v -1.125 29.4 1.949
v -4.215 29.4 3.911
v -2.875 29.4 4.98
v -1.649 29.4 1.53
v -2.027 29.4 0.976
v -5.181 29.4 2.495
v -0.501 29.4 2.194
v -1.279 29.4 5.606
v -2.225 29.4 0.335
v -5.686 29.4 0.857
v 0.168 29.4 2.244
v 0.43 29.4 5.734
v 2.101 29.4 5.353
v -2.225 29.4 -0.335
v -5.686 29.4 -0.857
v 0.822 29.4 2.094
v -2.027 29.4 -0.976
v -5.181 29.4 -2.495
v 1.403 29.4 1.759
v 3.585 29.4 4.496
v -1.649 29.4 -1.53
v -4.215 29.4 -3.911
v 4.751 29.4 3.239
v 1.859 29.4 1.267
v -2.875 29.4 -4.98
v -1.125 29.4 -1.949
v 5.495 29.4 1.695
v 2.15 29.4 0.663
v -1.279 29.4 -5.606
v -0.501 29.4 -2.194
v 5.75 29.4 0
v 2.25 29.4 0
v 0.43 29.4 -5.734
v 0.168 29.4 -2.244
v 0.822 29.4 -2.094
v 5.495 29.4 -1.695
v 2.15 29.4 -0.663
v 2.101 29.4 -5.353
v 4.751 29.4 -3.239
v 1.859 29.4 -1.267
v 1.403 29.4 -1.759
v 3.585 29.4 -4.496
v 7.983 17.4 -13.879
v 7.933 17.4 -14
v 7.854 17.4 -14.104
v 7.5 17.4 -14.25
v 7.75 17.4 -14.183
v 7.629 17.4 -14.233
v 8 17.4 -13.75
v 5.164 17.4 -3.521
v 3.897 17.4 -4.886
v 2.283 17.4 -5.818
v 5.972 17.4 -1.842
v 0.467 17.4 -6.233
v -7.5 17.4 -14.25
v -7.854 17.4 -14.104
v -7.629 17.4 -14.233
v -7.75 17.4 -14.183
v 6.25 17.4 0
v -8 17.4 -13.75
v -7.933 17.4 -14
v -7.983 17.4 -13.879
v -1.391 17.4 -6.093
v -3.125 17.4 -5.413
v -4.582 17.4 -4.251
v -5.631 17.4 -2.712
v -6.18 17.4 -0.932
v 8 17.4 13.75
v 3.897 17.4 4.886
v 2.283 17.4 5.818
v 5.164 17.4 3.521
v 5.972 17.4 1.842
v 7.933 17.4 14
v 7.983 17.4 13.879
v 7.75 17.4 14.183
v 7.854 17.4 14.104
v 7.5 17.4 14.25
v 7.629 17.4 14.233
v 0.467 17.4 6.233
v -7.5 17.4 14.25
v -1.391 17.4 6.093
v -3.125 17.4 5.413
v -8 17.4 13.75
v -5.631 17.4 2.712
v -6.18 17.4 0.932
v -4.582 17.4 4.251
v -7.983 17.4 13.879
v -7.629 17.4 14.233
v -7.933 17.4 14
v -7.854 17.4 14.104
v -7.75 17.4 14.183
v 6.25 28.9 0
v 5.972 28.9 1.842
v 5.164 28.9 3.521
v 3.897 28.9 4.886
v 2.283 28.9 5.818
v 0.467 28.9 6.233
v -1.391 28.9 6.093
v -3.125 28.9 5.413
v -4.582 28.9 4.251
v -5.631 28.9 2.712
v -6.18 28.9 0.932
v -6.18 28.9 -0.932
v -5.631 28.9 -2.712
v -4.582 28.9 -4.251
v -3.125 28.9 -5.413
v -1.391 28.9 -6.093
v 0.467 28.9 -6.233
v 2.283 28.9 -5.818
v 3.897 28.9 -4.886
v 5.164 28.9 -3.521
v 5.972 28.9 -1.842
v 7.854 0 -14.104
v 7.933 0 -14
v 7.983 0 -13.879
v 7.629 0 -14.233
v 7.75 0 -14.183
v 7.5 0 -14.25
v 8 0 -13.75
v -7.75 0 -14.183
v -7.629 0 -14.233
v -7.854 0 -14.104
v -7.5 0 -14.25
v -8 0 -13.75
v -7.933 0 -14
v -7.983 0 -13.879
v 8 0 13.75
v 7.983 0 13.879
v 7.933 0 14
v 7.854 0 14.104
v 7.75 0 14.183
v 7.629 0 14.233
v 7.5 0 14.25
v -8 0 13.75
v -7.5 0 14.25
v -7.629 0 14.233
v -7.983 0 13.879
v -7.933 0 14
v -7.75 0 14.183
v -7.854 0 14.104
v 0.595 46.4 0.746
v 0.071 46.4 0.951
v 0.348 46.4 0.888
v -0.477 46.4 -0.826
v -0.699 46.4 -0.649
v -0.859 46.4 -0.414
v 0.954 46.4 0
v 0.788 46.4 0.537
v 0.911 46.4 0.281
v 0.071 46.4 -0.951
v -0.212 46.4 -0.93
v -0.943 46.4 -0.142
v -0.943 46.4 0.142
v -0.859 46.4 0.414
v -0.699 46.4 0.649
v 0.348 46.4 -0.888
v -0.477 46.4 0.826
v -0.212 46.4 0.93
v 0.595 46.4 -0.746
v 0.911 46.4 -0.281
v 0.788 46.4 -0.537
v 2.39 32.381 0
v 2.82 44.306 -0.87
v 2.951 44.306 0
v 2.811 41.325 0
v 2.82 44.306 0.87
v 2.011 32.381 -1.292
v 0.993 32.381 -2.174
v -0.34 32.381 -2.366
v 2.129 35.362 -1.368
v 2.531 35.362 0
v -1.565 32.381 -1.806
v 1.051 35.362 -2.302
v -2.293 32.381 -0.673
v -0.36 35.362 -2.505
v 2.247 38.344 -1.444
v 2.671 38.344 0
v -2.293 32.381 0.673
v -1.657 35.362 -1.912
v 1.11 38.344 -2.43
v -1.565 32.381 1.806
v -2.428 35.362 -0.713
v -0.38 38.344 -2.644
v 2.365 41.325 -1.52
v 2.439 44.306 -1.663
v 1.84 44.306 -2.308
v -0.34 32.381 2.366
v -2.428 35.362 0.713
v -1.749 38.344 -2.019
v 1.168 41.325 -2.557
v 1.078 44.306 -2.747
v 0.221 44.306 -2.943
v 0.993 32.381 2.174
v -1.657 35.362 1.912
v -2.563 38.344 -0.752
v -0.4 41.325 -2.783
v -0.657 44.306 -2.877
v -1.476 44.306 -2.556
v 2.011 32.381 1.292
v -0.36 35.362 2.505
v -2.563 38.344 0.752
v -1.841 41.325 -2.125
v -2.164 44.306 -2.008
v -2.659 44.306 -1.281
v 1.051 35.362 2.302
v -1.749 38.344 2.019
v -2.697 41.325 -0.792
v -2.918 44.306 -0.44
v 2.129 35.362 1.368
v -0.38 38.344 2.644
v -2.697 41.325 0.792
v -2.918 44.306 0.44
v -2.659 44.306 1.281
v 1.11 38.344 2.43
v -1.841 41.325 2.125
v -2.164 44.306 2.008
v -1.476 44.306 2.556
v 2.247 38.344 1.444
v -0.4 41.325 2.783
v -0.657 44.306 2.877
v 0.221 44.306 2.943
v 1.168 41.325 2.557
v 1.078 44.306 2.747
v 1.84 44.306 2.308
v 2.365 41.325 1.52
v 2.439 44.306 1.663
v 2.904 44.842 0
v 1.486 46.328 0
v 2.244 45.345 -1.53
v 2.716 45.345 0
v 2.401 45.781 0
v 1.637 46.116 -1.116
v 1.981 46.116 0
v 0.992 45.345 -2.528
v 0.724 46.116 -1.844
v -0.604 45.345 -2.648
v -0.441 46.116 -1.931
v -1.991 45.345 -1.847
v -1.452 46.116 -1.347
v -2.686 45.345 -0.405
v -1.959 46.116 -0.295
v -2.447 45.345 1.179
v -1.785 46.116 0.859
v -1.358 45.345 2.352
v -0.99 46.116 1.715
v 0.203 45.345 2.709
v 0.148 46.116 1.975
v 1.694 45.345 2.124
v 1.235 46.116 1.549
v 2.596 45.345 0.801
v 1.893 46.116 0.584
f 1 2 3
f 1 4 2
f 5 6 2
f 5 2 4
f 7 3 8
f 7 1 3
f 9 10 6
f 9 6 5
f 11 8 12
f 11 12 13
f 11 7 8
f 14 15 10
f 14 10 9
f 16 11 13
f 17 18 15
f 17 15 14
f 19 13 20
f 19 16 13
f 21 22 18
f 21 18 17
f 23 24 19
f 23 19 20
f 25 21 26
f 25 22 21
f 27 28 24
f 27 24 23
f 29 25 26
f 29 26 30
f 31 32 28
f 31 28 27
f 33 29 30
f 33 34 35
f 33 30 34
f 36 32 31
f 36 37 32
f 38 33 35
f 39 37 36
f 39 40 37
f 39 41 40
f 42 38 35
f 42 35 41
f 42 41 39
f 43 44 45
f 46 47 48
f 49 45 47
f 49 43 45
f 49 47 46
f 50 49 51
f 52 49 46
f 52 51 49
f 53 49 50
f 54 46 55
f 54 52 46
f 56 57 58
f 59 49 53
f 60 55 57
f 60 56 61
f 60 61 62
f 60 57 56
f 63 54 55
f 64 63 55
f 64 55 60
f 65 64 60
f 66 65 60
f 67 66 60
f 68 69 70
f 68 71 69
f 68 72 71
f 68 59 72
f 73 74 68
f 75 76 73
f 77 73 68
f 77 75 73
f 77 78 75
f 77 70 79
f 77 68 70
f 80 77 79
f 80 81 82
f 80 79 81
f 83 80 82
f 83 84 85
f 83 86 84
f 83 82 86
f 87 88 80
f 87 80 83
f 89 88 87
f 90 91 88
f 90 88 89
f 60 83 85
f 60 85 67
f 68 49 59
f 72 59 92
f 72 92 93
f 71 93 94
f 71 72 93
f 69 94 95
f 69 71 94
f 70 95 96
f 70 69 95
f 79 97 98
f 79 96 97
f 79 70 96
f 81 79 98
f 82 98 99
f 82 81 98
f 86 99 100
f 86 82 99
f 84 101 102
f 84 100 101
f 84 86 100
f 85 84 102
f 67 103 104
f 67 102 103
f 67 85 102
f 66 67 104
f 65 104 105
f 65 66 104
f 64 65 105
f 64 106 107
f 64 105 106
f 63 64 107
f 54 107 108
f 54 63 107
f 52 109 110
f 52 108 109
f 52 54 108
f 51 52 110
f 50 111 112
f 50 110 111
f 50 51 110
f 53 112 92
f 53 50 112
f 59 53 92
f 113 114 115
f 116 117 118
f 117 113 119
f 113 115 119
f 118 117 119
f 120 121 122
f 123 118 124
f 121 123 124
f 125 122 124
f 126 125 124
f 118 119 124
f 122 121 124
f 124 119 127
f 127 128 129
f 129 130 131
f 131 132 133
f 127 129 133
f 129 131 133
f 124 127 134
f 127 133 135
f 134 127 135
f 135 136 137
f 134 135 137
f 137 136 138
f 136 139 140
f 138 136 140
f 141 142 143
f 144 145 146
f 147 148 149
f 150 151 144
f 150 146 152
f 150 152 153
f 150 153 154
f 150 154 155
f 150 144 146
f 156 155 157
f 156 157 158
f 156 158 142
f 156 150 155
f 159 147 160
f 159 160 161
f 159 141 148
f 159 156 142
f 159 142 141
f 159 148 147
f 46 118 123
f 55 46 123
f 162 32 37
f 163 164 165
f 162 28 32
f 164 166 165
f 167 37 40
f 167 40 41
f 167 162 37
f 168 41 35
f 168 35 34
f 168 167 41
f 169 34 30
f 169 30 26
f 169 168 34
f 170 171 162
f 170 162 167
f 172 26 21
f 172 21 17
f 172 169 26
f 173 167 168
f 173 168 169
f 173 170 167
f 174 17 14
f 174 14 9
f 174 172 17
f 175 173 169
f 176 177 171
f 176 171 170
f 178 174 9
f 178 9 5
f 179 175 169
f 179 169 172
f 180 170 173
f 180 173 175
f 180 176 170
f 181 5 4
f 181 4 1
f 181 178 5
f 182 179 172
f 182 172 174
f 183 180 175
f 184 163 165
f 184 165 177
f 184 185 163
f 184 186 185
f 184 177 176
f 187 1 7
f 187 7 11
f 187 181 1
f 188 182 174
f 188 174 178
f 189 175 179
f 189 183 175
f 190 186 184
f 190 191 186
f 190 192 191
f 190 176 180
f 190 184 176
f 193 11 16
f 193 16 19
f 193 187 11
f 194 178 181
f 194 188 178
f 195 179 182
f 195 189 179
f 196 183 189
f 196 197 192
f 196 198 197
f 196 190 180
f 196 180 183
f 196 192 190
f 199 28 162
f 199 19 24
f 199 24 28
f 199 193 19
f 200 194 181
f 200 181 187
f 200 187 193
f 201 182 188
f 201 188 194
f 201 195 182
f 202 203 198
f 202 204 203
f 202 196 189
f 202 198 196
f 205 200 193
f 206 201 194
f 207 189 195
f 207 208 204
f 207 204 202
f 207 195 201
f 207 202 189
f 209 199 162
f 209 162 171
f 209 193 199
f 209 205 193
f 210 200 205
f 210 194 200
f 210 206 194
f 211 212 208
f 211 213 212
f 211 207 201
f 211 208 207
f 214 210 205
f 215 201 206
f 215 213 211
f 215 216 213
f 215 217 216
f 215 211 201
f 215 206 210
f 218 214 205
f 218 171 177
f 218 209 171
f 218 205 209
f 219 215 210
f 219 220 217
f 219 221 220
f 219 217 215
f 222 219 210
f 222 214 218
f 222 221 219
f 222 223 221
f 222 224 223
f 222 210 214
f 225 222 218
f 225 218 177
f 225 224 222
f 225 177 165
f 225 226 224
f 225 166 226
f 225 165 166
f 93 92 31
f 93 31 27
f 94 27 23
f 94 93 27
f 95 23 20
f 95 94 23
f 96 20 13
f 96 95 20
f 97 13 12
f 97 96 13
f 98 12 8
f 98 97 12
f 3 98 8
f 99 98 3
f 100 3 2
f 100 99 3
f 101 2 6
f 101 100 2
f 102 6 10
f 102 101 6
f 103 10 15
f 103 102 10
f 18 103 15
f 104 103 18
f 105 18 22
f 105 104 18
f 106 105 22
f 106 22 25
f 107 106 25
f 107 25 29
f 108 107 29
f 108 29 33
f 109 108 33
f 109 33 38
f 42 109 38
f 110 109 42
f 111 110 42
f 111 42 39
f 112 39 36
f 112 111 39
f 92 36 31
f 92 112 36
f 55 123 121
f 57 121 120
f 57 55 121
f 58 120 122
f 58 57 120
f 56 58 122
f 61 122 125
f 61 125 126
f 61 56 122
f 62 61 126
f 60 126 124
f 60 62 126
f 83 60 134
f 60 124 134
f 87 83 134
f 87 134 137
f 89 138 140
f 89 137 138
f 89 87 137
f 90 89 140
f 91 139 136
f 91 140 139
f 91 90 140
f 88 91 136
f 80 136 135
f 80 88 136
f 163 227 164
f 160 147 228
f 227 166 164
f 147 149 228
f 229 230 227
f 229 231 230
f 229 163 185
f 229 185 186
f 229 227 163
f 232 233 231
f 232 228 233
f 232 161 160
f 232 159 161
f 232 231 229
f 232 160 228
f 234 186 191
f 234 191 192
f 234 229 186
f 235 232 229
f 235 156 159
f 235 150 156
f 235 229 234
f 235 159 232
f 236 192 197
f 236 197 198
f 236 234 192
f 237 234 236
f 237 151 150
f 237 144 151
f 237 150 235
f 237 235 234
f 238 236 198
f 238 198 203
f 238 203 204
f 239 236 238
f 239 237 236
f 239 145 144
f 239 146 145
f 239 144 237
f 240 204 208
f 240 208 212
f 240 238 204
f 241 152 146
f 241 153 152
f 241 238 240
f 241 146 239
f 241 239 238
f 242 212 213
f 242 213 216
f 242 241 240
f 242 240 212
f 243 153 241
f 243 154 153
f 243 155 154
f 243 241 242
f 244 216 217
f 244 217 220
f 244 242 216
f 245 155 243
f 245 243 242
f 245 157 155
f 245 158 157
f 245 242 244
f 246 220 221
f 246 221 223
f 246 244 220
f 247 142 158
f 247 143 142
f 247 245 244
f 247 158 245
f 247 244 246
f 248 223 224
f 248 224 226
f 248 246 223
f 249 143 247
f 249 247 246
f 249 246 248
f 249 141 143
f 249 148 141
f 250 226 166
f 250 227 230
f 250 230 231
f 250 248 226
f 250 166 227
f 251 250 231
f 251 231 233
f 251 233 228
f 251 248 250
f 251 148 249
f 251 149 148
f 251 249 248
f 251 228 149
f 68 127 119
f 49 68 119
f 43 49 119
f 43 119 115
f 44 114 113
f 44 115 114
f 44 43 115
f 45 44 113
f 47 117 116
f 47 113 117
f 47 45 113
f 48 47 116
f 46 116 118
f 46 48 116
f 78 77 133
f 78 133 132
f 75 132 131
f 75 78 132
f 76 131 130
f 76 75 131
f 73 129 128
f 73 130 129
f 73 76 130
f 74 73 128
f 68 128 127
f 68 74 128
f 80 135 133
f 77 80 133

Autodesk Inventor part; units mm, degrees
ref_plane "YZ Plane" through (0, 0, 0) normal (1, 0, 0) x (0, 1, 0)
ref_plane "XZ Plane" through (0, 0, 0) normal (0, 1, 0) x (-1, 0, 0)
sketch "Sketch1" plane through (0, 0, 0) normal (0, 1, 0) x (-1, 0, 0)
  line L0 (8, -14.25) -> (8, 14.25)
  line L1 (8, 14.25) -> (-8, 14.25)
  line L2 (-8, 14.25) -> (-8, -14.25)
  line L3 (-8, -14.25) -> (8, -14.25)
  line L4 (8, -14.25) -> (-8, 14.25) construction
  line L5 (8, 14.25) -> (-8, -14.25) construction
  point P0 (0, 0)
  dimension "d0" = 28.5
  dimension "d1" = 16
extrude "Extrusion1" add sketch "Sketch1" along normal blind 17.4
fillet "Fillet1" radius 0.5 4 edges at (-8, 8.7, 14.25) (8, 8.7, 14.25) (8, 8.7, -14.25) (-8, 8.7, -14.25)
sketch "Sketch2" plane through (0, 17.4, 0) normal (0, 1, 0) x (1, 0, 0)
  circle A0 centre (0, 0) radius 6.25
  dimension "d5" = 12.5
extrude "Extrusion2" add sketch "Sketch2" along normal blind 12
sketch "Sketch3" plane through (0, 29.4, 0) normal (0, 1, 0) x (1, 0, 0)
  circle A0 centre (0, 0) radius 2.25
  dimension "d8" = 4.5
ref_plane "Work Plane1" through (0, 46.4, 0) normal (0, 1, 0) x (1, 0, 0)
sketch "Sketch4" plane through (0, 46.4, 0) normal (0, 1, 0) x (1, 0, 0)
  circle A0 centre (0, 0) radius 3.05
  dimension "d10" = 6.1
loft "Loft1" add profiles "Sketch3", "Sketch4"
fillet "Fillet2" radius 2 1 edges at (-3.05, 46.4, 0)
chamfer "Chamfer1" distance 0.5 angle 45 1 edges at (-6.25, 29.4, 0)
thread "Thread2" size "M14x2" class "6g" standard "ANSI Metric M Profile" full length
properties part number "switch"
